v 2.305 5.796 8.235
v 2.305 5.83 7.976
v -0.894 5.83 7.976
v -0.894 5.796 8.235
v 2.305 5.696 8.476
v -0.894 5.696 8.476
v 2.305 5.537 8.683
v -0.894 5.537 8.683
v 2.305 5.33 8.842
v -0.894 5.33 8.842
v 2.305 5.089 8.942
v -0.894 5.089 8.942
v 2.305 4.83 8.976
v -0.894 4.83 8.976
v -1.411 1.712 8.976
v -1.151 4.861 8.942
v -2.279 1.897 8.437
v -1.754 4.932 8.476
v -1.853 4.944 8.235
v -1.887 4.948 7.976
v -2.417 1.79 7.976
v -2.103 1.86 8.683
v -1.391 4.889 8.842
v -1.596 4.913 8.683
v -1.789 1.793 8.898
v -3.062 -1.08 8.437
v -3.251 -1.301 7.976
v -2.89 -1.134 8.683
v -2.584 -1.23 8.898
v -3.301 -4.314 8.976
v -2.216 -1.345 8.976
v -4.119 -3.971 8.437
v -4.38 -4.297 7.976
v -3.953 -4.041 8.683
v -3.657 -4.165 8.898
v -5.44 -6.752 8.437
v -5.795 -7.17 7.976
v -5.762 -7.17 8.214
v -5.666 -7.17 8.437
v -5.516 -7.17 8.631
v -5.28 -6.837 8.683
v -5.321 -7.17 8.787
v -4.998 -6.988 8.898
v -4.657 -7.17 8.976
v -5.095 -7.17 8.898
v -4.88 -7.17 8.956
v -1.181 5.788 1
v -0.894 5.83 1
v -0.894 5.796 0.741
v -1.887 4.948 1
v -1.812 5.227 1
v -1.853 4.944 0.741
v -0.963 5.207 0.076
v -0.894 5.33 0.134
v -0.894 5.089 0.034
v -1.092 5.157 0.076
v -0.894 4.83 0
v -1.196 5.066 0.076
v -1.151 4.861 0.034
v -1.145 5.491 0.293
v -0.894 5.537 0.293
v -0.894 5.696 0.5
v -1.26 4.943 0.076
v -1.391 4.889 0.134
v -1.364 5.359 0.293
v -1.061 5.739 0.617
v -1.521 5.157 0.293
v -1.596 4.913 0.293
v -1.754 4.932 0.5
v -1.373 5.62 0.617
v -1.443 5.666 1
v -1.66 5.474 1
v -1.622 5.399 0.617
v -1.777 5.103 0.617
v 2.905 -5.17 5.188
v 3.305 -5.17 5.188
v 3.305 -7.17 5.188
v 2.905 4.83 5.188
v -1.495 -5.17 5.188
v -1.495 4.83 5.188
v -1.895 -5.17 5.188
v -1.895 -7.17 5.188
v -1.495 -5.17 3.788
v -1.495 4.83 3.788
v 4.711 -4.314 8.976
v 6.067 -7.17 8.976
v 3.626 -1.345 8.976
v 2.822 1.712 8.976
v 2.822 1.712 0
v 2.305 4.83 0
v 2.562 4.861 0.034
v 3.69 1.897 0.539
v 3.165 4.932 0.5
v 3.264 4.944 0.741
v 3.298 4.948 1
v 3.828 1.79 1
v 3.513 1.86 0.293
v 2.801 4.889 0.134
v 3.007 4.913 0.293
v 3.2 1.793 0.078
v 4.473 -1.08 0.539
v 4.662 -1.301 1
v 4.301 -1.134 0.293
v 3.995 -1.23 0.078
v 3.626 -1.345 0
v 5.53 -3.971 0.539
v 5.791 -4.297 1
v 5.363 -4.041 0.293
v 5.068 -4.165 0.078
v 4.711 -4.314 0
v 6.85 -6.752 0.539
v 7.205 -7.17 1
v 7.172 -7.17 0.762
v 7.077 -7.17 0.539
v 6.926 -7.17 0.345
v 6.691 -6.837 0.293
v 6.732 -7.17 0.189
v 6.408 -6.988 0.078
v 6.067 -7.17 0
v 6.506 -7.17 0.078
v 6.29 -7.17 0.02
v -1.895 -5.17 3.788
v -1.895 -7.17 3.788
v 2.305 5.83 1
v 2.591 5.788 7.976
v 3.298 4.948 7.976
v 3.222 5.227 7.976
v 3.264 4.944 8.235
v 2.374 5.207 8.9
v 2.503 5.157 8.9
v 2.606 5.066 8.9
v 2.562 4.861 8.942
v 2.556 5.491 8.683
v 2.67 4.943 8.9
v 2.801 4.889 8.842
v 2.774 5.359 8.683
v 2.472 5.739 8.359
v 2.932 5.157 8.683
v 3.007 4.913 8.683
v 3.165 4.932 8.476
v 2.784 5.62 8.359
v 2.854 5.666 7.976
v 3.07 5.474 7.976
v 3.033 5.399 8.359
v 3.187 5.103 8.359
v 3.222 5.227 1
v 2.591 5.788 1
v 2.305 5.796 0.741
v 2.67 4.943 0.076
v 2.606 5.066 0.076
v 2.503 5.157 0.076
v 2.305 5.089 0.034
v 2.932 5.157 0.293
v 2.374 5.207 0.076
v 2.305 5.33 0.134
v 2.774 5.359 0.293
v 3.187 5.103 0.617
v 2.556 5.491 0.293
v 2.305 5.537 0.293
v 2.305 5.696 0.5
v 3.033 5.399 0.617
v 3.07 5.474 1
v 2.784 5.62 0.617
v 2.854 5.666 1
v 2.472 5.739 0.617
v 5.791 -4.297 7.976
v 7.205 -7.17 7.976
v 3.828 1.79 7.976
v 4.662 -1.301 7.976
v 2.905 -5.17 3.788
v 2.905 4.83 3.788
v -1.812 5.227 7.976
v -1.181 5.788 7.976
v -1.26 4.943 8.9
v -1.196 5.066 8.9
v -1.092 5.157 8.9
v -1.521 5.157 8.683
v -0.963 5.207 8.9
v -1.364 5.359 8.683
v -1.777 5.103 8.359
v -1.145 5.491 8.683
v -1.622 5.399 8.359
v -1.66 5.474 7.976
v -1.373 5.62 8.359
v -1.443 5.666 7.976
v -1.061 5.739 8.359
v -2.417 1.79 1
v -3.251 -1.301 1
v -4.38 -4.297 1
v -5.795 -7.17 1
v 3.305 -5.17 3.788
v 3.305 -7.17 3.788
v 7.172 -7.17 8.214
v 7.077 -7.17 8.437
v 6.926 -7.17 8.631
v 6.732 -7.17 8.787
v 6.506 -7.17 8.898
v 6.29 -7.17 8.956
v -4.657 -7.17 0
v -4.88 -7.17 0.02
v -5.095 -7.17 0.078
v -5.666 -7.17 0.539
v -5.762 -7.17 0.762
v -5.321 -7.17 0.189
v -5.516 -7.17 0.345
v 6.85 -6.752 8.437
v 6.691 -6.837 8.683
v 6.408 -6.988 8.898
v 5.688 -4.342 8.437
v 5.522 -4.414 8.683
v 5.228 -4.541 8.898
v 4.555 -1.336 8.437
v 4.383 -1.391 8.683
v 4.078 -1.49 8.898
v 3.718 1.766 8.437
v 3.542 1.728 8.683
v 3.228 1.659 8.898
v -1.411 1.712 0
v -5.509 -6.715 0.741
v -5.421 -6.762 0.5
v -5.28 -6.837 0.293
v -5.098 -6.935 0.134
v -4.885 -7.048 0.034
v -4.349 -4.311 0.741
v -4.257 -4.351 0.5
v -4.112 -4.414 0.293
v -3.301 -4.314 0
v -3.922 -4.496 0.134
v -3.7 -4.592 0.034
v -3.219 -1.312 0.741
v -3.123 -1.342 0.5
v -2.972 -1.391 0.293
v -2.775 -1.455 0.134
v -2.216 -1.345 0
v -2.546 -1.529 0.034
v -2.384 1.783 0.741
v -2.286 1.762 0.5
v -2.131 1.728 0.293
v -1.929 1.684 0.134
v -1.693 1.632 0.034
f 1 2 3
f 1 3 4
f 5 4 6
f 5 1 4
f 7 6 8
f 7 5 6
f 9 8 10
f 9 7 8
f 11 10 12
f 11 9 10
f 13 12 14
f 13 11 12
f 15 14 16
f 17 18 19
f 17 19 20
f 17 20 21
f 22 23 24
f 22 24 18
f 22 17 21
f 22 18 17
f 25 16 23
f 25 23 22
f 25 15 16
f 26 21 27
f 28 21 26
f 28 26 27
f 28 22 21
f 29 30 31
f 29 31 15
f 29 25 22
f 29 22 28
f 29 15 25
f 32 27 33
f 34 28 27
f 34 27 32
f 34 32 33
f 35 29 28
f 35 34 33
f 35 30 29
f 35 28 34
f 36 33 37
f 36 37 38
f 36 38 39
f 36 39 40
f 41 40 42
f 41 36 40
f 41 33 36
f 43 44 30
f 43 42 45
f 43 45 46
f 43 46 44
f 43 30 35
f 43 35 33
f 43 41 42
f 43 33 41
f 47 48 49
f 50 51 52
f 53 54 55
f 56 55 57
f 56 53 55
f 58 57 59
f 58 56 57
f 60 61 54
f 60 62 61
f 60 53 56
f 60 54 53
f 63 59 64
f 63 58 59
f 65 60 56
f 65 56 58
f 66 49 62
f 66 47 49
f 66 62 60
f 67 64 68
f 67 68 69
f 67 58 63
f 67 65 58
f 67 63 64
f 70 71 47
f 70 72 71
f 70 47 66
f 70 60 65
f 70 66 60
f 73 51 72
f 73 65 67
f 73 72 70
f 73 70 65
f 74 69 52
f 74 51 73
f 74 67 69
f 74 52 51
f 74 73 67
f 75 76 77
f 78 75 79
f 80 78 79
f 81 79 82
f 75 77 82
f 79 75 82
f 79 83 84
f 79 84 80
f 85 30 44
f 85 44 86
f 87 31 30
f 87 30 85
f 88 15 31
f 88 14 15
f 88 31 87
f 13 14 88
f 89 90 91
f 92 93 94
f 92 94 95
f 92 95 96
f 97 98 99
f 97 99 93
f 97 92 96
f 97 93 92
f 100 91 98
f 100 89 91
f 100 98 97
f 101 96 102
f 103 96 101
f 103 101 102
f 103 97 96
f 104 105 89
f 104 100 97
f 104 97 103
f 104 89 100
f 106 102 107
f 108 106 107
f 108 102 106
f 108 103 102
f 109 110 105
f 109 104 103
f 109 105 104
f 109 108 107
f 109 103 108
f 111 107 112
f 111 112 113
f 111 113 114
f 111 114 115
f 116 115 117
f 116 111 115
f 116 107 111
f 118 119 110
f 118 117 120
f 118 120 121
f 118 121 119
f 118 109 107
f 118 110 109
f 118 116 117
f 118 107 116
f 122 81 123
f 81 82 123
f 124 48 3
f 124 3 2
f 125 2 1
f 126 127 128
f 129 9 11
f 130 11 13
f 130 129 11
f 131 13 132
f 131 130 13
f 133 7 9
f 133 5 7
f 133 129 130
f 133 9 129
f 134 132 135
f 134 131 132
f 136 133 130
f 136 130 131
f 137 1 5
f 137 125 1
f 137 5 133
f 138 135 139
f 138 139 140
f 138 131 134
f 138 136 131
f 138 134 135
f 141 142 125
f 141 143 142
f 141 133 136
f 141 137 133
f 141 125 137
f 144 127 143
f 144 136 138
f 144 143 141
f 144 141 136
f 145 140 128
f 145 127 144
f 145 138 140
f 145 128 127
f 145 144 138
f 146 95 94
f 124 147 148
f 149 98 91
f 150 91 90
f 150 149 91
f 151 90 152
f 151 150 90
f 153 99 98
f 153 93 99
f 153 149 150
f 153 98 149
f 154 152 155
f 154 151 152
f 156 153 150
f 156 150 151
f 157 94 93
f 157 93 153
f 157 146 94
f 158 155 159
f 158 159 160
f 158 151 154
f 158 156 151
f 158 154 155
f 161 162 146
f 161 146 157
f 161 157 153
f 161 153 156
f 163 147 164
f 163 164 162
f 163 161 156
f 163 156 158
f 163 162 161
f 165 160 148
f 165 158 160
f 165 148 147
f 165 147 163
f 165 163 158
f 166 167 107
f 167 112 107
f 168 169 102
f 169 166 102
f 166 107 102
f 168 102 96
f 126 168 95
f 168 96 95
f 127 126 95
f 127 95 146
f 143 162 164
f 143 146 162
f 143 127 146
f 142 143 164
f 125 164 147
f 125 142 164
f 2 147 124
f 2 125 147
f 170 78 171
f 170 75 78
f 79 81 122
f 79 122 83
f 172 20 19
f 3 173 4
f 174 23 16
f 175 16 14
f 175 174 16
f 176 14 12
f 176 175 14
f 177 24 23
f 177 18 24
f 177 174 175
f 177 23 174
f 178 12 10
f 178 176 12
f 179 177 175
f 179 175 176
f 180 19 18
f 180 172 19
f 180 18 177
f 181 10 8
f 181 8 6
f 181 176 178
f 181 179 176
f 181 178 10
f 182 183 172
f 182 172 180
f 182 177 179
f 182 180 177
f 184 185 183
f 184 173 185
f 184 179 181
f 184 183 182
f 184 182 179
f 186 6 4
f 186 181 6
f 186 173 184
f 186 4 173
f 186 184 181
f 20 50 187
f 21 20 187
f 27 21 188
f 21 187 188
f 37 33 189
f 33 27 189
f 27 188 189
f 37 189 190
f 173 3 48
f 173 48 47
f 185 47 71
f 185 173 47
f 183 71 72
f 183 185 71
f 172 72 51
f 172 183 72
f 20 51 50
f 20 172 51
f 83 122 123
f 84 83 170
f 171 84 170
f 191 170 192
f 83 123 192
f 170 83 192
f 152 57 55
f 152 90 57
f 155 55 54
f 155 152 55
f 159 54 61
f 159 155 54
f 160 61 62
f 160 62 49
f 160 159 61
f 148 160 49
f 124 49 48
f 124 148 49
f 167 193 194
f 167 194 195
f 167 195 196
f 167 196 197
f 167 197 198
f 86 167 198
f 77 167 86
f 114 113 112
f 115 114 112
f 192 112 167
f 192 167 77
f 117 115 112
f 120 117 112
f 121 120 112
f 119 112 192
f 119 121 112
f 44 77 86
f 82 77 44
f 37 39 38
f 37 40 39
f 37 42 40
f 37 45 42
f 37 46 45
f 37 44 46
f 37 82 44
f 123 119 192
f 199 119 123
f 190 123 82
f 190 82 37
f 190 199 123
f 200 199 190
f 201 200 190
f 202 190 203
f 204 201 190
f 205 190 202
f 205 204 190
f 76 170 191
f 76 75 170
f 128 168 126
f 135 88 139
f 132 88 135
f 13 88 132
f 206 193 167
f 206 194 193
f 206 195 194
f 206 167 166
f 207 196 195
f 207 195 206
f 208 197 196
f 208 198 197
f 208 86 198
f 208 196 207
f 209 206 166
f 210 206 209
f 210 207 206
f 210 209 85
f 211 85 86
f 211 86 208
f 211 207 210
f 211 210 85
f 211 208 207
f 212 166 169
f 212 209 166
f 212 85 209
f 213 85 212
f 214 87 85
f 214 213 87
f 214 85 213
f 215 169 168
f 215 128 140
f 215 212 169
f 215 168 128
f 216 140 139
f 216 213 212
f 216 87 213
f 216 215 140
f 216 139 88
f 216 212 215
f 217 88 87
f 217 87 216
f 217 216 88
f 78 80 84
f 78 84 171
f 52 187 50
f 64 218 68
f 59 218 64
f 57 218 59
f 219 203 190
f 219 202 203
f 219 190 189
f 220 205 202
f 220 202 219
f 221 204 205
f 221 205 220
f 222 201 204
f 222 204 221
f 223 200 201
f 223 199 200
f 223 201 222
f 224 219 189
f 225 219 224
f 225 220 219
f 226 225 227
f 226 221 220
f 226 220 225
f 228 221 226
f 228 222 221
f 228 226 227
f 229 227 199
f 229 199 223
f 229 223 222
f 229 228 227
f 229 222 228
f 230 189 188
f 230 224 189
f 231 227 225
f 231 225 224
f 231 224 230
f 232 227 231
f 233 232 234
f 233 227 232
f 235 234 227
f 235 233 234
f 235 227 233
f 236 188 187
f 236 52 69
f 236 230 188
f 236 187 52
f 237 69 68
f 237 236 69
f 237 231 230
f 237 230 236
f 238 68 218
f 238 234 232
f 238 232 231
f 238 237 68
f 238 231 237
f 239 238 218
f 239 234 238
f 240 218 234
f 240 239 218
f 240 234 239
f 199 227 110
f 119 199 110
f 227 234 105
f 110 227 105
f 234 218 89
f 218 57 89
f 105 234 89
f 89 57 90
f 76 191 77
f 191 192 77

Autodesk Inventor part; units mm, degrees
ref_plane "YZ Plane" through (0, 0, 0) normal (1, 0, 0) x (0, 1, 0)
ref_plane "XZ Plane" through (0, 0, 0) normal (0, 1, 0) x (-1, 0, 0)
ref_plane "XY Plane" through (0, 0, 0) normal (0, 0, 1) x (1, 0, 0)
sketch "Sketch1" plane through (0, 0, 0) normal (0, 0, 1) x (1, 0, 0)
  line L0 (-5.7947, 5.8302) -> (7.2053, 5.8302)
  line L1 (7.2053, 5.8302) -> (7.2053, -7.1698)
  line L2 (7.2053, -7.1698) -> (-5.7947, -7.1698)
  line L3 (-5.7947, -7.1698) -> (-5.7947, 5.8302)
  arc A0 (-5.7947, -7.1698) -> (-1.7947, 5.8302) centre (-34.6583, 8.8267) ccw
  arc A1 (3.2053, 5.8302) -> (7.2053, -7.1698) centre (36.069, 8.8267) ccw
  point P0 (0, 0)
  dimension "d0" = 13
  dimension "d1" = 13
  dimension "d2" = 4
  dimension "d3" = 4
  dimension "d4" = 33
  dimension "d5" = 33
extrude "Extrusion1" add sketch "Sketch1" along normal blind 8.976 contours L0 A1 L2 A0
sketch "Sketch2" plane through (-5.7947, -7.1698, 0) normal (0, -1, 0) x (1, 0, 0)
  line L0 (9.1, 5.188) -> (3.9, 5.188)
  line L1 (3.9, 5.188) -> (3.9, 3.788)
  line L2 (3.9, 3.788) -> (9.1, 3.788)
  line L3 (9.1, 3.788) -> (9.1, 5.188)
  line L4 (0, 8.976) -> (13, 8.976) projected
  line L5 (13, 0) -> (13, 8.976) projected
  point P0 (5.7947, 0)
  dimension "d8" = 1.4
  dimension "d9" = 5.2
  dimension "d10" = 3.788
  dimension "d11" = 3.9
extrude "Extrusion2" cut sketch "Sketch2" against normal blind 2
sketch "Sketch3" plane through (-5.7947, -5.1698, 0) normal (0, -1, 0) x (1, 0, 0)
  line L0 (9.1, 3.788) -> (3.9, 3.788) projected
  line L1 (4.3, 5.188) -> (8.7, 5.188)
  line L2 (8.7, 5.188) -> (8.7, 3.788)
  line L3 (8.7, 3.788) -> (4.3, 3.788)
  line L4 (4.3, 3.788) -> (4.3, 5.188)
  line L5 (3.9, 5.188) -> (9.1, 5.188) projected
  line L6 (3.9, 3.788) -> (3.9, 5.188) projected
  line L7 (9.1, 5.188) -> (9.1, 3.788) projected
  point P0 (5.7947, 0)
  dimension "d14" = 0
  dimension "d15" = 0.4
  dimension "d16" = 0.4
extrude "Extrusion3" cut sketch "Sketch3" against normal blind 10 contours L0 L4 L1 L2
fillet "Fillet1" radius 1 8 edges at (3.2053, 5.8302, 4.488) (-3.1176, -0.8781, 8.976) (0.7053, 5.8302, 8.976) (-1.7947, 5.8302, 4.488) (0.7053, 5.8302, 0) (4.5283, -0.8781, 0) (-3.1176, -0.8781, 0) (4.5283, -0.8781, 8.976)
properties part number "SingleSliderCap"
